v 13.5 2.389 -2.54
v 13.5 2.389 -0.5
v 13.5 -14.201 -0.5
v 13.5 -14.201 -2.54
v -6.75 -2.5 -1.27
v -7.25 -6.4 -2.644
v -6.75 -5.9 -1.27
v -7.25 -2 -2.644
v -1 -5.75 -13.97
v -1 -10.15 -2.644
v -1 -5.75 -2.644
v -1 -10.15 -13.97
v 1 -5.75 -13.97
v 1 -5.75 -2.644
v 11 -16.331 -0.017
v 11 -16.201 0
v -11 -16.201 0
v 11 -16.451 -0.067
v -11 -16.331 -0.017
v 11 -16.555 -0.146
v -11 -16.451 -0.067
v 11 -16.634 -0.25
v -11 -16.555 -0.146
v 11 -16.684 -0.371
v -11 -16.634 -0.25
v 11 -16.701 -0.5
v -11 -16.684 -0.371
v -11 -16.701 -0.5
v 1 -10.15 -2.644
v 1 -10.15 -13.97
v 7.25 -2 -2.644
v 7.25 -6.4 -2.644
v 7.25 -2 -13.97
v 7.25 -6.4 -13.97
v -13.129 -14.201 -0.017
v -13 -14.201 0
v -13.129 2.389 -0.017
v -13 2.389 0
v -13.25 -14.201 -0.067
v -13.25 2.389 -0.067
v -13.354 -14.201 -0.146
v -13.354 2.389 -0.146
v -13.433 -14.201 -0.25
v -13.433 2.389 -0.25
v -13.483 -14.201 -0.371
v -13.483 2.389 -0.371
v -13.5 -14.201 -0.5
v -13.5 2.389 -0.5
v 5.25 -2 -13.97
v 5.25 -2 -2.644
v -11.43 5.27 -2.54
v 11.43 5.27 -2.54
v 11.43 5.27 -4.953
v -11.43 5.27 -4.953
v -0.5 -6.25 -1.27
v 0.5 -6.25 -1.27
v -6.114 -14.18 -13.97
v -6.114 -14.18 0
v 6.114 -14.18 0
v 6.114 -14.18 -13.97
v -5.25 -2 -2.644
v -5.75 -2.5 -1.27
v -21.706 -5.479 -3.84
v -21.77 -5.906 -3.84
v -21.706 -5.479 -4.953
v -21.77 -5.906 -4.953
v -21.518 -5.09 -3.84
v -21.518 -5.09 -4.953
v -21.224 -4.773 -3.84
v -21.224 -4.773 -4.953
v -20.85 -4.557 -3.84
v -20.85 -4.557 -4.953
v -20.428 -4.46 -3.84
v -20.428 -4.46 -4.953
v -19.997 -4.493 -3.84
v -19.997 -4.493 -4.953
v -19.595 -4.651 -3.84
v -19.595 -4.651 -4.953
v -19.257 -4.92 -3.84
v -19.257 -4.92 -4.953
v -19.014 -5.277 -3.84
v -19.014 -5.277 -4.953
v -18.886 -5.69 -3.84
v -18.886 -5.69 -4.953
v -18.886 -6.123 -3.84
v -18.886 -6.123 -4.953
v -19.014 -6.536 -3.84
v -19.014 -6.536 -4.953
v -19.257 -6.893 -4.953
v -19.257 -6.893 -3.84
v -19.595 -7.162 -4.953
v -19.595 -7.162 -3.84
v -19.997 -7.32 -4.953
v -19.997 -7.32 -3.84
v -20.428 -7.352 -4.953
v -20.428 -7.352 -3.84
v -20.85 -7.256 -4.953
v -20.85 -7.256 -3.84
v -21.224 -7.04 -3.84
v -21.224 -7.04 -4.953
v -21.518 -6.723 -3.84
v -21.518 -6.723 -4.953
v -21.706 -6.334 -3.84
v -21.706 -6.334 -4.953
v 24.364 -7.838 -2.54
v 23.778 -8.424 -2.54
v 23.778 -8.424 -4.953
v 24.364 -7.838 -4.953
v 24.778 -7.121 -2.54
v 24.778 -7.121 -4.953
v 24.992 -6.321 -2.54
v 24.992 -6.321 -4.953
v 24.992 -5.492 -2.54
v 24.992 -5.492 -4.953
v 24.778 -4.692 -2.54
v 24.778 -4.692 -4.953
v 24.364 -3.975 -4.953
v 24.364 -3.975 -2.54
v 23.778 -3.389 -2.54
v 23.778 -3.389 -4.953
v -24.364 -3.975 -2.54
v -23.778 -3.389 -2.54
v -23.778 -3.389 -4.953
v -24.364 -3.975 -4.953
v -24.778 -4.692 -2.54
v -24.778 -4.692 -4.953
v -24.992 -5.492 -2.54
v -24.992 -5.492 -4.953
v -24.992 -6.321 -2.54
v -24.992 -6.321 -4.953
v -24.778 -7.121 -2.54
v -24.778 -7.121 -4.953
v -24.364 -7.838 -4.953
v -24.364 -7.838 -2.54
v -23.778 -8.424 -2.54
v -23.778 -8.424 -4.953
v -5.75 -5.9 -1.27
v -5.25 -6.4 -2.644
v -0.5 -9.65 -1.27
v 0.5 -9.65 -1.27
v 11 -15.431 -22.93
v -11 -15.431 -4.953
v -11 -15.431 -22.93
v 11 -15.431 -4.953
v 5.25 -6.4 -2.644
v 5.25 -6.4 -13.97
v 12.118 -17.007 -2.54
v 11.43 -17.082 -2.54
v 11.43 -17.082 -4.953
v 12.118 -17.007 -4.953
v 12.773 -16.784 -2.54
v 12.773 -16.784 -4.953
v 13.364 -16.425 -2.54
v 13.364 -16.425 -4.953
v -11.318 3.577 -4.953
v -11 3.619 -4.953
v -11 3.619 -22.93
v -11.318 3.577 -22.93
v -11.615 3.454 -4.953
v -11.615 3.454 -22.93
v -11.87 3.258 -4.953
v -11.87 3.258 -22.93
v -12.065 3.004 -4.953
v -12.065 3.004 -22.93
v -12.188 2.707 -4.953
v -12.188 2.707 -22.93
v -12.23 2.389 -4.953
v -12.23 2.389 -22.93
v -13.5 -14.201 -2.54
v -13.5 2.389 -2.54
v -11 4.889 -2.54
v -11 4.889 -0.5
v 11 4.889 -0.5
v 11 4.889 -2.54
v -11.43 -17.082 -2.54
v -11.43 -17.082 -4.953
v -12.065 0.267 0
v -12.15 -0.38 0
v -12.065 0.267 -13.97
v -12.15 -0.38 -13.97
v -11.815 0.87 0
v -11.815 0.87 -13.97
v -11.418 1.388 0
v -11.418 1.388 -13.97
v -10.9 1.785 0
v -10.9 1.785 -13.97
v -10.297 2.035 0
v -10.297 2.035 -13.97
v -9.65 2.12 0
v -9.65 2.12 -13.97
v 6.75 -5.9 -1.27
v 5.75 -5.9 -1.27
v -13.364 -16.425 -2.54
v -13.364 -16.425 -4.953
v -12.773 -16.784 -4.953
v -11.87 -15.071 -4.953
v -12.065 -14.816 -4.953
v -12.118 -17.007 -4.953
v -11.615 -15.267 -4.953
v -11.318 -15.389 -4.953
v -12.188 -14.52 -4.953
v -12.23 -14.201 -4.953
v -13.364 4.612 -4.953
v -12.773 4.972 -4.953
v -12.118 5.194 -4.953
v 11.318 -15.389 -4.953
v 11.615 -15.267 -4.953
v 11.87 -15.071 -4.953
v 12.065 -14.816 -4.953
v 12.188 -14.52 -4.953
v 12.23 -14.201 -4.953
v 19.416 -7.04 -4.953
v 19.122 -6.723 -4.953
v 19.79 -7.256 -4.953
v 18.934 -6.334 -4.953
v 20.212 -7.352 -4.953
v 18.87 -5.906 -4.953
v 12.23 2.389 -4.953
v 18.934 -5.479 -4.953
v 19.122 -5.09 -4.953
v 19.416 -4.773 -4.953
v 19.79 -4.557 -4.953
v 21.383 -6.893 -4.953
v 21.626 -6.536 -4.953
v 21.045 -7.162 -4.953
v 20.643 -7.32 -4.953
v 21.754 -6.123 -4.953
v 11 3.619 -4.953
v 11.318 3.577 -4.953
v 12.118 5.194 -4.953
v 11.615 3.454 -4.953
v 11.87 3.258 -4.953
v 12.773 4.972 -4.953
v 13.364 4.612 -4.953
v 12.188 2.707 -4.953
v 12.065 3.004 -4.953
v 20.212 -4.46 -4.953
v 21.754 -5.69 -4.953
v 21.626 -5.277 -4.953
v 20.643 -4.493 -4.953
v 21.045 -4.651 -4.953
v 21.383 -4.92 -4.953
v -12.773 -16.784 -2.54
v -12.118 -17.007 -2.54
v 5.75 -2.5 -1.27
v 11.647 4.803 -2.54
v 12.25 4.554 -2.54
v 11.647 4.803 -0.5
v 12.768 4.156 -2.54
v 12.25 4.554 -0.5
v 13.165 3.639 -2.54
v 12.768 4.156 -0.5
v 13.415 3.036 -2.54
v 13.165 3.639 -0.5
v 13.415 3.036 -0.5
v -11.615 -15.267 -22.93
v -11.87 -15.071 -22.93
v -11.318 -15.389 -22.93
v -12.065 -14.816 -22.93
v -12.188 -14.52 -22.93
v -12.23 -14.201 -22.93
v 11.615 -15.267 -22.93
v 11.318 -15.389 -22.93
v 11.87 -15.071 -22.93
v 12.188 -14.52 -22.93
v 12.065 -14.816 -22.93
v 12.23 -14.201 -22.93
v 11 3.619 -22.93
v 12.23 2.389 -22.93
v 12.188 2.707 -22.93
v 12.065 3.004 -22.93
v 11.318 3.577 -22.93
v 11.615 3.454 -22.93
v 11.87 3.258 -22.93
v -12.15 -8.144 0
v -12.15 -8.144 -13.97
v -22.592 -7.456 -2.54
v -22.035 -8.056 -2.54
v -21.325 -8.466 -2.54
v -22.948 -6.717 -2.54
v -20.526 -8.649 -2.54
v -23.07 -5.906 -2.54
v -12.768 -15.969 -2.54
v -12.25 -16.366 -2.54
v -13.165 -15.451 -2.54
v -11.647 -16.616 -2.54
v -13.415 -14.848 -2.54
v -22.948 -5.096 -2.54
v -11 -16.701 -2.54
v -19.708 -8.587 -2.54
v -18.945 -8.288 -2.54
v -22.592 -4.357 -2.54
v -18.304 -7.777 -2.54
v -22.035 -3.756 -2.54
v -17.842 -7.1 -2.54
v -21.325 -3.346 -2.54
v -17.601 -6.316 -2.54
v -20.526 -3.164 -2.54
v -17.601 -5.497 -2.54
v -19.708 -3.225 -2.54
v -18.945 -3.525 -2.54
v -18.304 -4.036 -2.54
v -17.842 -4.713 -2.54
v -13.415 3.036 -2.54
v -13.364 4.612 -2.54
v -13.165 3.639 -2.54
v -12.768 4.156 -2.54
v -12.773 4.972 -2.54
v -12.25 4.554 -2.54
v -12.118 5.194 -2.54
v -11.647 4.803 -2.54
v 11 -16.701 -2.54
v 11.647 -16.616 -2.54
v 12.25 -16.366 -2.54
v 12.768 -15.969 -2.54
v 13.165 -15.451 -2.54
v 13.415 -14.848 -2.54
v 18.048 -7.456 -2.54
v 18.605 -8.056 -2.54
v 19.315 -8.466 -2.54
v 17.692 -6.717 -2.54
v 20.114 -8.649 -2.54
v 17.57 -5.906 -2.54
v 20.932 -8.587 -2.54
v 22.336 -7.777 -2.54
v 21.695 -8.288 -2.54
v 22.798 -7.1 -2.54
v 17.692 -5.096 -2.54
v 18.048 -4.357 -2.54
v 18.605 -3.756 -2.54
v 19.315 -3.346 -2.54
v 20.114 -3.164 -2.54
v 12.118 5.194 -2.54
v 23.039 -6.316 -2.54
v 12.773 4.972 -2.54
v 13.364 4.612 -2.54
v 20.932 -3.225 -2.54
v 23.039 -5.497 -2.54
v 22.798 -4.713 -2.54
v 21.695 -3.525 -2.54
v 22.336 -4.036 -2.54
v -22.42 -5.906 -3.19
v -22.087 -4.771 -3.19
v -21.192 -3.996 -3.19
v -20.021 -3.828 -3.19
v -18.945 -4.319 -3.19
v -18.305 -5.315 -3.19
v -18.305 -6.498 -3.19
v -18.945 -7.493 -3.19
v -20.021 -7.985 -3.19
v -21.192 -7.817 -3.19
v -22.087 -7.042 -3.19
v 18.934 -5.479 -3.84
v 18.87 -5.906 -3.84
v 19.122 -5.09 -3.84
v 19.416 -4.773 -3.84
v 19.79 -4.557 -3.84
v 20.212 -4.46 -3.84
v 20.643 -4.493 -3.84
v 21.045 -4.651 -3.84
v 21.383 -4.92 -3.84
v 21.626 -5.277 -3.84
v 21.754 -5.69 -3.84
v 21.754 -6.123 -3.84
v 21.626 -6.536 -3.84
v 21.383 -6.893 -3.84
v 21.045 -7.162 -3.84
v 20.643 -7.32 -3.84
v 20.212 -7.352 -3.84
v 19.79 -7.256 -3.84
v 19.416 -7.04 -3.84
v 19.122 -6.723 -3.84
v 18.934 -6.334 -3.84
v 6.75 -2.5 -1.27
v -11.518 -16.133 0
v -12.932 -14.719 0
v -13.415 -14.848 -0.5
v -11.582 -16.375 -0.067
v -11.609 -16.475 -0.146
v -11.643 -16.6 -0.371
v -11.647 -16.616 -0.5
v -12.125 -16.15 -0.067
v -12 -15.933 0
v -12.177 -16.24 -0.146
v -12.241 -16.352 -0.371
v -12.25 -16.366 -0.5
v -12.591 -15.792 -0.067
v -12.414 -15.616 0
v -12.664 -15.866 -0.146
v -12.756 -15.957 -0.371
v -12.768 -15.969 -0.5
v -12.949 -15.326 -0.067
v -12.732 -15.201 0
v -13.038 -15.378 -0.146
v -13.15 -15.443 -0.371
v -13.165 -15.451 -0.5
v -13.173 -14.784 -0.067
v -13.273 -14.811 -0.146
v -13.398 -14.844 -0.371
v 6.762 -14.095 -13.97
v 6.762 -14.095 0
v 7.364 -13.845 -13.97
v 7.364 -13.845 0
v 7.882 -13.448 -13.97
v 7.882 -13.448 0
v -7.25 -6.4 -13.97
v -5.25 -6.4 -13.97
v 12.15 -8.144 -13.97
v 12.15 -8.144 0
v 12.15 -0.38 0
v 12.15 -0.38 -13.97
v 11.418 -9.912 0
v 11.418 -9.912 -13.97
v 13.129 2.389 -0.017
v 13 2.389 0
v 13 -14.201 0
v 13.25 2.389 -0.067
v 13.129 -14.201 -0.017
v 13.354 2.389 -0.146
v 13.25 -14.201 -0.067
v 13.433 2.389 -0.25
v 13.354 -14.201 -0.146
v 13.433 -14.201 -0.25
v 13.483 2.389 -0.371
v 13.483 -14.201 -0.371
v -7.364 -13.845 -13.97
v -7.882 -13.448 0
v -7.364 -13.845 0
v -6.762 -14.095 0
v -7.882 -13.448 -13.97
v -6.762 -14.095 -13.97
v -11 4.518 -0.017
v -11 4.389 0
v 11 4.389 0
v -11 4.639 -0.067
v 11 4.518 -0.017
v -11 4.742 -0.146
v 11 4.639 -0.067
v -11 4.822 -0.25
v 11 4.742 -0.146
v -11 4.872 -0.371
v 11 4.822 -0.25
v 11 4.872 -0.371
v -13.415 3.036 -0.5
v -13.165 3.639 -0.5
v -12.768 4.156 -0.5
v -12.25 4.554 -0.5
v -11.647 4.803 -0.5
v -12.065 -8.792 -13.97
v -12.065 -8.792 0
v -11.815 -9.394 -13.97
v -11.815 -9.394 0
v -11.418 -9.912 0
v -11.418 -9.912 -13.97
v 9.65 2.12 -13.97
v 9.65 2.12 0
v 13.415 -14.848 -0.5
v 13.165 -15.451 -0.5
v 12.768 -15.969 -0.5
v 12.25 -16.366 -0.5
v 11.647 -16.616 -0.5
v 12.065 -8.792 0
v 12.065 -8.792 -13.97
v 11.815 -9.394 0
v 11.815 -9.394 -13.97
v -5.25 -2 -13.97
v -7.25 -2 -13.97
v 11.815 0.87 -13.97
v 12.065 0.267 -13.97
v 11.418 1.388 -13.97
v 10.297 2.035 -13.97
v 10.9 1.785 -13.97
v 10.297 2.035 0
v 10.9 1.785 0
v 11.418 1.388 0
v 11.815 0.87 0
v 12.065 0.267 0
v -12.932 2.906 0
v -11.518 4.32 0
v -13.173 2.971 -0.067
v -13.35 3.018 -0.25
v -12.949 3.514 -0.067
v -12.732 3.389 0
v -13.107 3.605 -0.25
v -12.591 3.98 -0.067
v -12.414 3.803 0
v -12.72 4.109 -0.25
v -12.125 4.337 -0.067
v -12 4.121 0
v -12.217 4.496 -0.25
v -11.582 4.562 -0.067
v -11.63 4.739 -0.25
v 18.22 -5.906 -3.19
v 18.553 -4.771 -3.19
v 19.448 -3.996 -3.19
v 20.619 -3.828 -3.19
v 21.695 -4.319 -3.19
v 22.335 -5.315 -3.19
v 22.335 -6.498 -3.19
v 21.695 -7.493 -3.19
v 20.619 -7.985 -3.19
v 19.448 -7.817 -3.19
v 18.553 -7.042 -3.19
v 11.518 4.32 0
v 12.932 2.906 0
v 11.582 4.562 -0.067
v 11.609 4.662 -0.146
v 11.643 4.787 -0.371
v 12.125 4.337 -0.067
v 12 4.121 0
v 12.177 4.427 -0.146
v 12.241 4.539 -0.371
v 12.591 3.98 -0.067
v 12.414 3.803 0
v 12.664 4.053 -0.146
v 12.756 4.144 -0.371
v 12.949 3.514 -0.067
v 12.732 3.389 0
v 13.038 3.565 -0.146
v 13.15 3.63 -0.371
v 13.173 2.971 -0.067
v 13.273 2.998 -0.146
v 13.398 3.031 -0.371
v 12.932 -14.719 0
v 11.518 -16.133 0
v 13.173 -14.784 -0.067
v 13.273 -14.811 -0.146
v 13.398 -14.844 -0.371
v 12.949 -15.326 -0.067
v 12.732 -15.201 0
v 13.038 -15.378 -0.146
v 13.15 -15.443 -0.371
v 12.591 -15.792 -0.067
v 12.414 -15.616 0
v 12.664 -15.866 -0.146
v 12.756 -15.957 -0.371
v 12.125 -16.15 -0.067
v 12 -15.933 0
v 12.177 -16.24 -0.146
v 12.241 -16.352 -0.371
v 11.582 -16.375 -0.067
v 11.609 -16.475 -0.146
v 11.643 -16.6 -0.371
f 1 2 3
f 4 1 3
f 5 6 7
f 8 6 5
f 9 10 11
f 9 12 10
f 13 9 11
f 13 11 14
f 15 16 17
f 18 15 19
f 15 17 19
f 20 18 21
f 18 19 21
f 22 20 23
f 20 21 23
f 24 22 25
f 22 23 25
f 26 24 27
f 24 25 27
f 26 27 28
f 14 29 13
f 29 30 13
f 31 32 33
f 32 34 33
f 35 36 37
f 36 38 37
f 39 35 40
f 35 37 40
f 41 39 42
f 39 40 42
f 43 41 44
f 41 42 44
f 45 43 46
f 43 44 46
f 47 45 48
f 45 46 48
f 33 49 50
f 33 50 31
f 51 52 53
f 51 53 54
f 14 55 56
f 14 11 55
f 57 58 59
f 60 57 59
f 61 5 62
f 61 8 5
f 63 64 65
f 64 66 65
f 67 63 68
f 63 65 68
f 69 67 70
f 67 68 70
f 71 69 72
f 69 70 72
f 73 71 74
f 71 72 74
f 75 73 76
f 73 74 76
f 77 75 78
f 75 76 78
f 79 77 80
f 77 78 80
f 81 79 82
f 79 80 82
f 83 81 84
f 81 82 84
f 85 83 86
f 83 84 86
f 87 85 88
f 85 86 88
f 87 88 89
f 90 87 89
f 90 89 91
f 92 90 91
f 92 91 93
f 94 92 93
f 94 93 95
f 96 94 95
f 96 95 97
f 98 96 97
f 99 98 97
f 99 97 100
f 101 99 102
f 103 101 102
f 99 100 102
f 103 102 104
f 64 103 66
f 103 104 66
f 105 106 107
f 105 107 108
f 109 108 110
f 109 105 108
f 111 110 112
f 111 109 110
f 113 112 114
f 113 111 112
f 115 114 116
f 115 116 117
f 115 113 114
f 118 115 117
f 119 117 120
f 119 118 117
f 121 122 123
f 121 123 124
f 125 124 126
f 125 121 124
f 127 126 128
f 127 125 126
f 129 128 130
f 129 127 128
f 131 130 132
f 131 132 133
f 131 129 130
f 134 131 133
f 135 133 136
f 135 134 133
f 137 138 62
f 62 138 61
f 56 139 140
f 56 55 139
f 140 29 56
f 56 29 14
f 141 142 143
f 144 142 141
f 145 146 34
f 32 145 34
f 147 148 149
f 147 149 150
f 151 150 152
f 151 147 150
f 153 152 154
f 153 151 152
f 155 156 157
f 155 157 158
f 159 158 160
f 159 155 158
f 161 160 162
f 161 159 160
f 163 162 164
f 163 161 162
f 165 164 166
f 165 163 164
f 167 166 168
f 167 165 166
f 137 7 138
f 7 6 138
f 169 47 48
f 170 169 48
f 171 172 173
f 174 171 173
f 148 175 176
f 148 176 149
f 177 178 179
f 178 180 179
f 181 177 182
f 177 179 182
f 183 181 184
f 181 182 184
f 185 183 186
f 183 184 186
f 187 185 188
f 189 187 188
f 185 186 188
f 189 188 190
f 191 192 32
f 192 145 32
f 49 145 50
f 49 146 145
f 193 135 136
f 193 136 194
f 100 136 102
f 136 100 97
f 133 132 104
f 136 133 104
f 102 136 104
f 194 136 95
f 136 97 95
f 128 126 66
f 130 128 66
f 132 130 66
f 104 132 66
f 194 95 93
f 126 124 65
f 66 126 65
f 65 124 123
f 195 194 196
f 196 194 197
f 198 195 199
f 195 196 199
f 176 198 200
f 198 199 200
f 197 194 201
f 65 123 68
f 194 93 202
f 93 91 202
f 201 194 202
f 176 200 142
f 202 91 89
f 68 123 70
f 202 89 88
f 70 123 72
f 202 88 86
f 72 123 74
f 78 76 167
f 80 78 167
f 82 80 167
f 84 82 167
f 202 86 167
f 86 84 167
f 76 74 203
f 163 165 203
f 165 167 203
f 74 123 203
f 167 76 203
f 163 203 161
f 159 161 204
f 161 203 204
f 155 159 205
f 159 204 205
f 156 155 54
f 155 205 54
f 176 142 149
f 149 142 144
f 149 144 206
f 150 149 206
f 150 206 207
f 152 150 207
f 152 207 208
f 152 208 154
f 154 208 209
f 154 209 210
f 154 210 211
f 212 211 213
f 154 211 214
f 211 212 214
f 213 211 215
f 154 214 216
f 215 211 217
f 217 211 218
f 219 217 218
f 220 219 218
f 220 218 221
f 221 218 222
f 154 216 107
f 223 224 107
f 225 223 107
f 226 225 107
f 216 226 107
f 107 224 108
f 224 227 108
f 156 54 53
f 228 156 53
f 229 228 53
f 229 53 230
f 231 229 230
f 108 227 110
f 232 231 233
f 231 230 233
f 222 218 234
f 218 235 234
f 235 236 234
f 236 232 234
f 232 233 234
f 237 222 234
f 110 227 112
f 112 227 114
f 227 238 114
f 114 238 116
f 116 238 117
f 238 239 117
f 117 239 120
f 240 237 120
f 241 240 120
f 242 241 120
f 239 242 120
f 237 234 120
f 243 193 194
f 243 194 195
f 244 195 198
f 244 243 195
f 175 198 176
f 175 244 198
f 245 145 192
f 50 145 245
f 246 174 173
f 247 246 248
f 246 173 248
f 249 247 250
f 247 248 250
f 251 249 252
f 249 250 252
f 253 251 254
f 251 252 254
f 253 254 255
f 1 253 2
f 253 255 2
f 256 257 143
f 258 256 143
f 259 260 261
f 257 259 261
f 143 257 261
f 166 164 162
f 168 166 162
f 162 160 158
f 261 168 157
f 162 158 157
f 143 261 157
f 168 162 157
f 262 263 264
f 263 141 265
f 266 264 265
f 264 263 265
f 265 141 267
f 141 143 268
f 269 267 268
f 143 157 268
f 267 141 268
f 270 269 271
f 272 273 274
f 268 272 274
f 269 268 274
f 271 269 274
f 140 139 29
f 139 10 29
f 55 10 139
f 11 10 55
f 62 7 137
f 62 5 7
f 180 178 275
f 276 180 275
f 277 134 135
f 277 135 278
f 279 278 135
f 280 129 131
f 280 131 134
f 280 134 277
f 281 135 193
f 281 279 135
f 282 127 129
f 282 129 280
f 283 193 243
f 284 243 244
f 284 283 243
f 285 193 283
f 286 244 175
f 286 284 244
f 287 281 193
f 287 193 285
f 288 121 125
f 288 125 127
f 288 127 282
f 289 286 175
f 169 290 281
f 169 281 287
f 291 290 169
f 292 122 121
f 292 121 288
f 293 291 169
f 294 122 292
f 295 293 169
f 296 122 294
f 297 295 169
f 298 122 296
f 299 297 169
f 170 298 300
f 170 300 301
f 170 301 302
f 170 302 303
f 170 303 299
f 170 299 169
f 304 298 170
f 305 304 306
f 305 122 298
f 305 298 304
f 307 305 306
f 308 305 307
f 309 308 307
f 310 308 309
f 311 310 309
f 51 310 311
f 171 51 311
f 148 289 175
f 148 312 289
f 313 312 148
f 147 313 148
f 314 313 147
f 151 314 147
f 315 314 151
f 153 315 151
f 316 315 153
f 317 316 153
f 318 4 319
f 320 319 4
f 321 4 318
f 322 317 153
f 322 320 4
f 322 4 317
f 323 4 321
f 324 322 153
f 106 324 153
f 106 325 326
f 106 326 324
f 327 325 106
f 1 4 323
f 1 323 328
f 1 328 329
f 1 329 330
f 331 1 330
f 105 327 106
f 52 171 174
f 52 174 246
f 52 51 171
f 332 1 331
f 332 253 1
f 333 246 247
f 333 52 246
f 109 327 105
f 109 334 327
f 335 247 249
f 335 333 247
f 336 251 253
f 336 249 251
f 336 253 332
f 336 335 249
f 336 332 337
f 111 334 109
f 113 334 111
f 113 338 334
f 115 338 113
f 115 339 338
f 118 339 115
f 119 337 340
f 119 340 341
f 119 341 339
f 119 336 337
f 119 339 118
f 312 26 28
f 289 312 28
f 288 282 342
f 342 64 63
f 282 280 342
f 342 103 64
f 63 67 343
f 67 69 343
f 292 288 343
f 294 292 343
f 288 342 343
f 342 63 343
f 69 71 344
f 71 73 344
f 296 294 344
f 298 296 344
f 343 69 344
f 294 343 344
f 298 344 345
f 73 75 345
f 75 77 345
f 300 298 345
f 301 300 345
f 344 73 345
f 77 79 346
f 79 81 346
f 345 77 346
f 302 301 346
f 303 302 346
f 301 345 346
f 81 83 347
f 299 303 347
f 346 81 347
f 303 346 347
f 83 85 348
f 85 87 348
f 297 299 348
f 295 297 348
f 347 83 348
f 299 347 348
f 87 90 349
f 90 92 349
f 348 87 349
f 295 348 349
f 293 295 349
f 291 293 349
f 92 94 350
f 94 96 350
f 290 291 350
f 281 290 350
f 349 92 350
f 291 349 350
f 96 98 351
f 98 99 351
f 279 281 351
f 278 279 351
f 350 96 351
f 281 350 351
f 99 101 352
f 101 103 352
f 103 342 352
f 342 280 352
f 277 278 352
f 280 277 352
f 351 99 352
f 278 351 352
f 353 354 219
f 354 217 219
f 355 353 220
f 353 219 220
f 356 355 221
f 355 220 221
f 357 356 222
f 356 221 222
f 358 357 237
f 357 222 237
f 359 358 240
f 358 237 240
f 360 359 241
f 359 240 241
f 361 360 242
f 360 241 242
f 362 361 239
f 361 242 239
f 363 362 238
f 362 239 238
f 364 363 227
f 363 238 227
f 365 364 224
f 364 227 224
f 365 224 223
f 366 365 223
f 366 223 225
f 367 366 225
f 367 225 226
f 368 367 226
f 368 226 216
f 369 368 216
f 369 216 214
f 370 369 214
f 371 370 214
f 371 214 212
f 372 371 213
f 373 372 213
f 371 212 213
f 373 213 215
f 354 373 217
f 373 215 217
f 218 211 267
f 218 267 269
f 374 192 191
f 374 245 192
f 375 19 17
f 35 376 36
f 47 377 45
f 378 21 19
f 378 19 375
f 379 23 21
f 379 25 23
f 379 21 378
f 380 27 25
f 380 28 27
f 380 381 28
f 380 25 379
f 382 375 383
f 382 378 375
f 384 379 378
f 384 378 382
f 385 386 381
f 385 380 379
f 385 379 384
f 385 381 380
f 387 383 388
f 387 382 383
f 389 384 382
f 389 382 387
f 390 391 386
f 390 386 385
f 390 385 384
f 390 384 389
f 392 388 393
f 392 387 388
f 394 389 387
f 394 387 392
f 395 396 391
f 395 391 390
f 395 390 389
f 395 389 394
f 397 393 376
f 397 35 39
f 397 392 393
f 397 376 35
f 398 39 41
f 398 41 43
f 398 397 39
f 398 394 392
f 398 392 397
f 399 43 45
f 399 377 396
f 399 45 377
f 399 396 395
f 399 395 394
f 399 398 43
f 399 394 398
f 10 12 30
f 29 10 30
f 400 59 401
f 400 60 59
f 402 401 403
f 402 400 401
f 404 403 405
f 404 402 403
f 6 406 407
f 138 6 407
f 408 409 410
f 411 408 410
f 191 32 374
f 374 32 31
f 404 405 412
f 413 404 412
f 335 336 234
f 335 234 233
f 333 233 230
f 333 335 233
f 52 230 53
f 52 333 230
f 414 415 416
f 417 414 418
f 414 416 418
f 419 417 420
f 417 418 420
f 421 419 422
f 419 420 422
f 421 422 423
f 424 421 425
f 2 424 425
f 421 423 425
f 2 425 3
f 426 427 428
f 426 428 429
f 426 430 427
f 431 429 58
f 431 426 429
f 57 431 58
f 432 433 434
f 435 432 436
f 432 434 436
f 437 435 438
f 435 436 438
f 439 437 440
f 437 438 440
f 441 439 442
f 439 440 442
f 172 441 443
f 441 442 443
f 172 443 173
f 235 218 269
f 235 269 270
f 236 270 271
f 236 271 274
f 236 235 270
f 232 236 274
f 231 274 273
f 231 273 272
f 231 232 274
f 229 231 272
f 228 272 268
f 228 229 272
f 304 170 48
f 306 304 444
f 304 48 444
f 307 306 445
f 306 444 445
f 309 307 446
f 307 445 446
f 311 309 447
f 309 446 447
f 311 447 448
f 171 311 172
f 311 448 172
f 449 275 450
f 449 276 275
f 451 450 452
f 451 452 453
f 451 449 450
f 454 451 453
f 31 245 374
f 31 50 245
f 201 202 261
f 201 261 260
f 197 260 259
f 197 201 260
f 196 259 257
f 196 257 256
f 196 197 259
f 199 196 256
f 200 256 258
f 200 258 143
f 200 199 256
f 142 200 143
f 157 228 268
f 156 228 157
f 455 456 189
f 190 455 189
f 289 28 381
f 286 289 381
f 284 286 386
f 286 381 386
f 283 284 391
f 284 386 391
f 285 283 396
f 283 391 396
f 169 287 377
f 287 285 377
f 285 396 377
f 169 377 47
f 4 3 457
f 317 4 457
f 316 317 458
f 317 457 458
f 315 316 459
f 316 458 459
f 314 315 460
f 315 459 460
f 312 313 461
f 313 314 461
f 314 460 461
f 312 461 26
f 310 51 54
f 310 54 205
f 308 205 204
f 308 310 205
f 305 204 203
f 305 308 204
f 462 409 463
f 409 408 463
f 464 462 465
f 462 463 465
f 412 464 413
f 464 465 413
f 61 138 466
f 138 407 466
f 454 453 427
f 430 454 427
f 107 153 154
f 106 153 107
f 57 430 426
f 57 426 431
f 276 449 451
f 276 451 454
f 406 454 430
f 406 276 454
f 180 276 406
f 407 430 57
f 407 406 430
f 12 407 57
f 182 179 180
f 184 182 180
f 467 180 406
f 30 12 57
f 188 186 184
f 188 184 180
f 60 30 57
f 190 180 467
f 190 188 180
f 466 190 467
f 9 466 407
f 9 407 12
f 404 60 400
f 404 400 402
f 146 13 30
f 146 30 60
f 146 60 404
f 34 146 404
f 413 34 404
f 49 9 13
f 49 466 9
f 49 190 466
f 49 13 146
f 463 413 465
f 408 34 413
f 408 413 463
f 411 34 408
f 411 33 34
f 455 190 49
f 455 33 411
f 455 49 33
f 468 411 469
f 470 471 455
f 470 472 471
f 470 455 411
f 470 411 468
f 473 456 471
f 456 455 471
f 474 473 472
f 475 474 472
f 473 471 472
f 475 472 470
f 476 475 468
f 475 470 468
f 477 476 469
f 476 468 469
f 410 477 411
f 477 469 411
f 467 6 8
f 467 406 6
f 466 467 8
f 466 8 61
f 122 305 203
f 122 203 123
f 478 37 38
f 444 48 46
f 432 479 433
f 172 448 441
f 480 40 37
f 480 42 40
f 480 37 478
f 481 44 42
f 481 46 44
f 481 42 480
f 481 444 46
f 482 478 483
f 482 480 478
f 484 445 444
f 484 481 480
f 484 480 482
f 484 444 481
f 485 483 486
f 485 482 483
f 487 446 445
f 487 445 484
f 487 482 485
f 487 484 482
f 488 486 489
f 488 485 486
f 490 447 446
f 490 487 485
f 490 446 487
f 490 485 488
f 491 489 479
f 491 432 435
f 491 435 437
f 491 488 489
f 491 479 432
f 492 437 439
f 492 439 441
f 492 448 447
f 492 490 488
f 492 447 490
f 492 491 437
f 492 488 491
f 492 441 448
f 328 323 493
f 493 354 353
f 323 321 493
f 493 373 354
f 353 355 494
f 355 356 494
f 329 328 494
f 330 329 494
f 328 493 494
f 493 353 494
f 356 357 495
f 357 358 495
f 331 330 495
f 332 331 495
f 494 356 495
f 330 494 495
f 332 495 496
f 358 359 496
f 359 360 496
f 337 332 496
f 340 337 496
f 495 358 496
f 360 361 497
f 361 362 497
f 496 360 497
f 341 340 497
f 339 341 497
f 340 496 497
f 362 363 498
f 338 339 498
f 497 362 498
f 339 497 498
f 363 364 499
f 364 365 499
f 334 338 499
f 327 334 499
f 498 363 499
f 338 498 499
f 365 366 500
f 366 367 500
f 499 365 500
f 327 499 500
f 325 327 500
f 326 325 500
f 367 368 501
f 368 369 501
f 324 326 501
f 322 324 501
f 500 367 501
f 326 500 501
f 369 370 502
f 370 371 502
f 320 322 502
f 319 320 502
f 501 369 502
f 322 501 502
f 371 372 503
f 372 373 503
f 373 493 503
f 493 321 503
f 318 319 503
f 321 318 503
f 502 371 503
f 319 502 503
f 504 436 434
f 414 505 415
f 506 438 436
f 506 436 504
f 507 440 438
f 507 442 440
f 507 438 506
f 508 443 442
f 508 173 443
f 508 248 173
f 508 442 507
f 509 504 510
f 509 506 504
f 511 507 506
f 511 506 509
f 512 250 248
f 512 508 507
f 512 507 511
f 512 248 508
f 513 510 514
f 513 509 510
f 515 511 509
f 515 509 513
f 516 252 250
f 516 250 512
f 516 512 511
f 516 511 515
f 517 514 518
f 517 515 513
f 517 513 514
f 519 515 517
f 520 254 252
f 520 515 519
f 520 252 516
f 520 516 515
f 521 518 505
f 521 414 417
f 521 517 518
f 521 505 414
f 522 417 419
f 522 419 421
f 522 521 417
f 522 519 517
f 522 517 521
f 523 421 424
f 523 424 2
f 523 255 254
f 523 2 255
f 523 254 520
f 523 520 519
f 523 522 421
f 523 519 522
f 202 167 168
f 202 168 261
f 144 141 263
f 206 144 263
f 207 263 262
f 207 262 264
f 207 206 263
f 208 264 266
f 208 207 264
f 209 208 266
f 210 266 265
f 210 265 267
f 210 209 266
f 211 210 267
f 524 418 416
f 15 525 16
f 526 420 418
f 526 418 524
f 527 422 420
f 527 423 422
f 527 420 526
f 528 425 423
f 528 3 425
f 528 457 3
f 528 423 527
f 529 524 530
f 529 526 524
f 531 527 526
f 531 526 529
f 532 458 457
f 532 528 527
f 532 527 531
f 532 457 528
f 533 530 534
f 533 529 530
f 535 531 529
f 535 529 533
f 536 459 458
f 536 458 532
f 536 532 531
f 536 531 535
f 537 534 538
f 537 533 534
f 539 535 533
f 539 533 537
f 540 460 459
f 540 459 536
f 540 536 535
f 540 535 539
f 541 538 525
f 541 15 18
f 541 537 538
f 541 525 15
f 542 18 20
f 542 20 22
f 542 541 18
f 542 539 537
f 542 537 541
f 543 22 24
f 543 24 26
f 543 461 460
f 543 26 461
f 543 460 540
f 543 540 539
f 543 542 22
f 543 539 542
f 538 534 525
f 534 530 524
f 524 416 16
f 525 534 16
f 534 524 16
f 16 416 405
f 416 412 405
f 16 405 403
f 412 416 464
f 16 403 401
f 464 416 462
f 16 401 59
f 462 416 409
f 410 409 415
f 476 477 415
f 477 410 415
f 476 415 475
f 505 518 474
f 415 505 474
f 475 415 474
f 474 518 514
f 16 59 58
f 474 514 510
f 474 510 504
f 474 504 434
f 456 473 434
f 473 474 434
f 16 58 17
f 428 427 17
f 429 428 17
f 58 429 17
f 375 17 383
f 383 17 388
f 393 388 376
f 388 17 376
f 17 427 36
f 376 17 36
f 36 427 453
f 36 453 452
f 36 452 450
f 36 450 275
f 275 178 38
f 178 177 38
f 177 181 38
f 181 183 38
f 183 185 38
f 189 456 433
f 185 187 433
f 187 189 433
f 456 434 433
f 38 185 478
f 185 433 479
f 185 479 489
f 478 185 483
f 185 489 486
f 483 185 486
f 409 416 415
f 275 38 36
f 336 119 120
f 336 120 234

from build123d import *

# Parameters (mm, degrees)
EXTRUDE1_DEPTH                                    = 5.15
FILLET1_R                                         = 1
EXTRUDE2_DEPTH                                    = 17.78
EXTRUDE3_DEPTH                                    = 13.97
EXTRUDE4_DEPTH                                    = 3.81
FILLET2_R                                         = 2.5
SKETCH5_W                                         = 2
SKETCH5_H                                         = 4.4
EXTRUDE5_DEPTH                                    = 12.7
CHAMFER1_SIZE                                     = 0.5
CHAMFER1_SIZE2                                    = 1.37373871
CHAMFER1_PART_2_SIZE                              = 0.5
CHAMFER1_PART_2_SIZE2                             = 1.37373871
CHAMFER1_PART_3_SIZE                              = 0.5
CHAMFER1_PART_3_SIZE2                             = 1.37373871
CHAMFER2_SIZE                                     = 0.5
CHAMFER2_SIZE2                                    = 1.37373871
CHAMFER2_PART_2_SIZE                              = 0.5
CHAMFER2_PART_2_SIZE2                             = 1.37373871
CHAMFER2_PART_3_SIZE                              = 0.5
CHAMFER2_PART_3_SIZE2                             = 1.37373871
FILLET3_R                                         = 0.5
SKETCH10_OUTSIDE_W                                = 57.448
SKETCH10_OUTSIDE_H                                = 47.956
EXTRUDE10_DEPTH                                   = 20.12
SKETCH11_OUTSIDE_W                                = 37.296
SKETCH11_OUTSIDE_H                                = 31.886
EXTRUDE11_DEPTH                                   = 21.39
EXTRUDE12_DEPTH                                   = 2.413
CSK_FOR_M2_5_FLAT_HEAD_MACHINE_SCREW1_D           = 2.9
CSK_FOR_M2_5_FLAT_HEAD_MACHINE_SCREW1_CSINK_D     = 5.5
CSK_FOR_M2_5_FLAT_HEAD_MACHINE_SCREW1_CSINK_ANGLE = 90


with BuildPart() as part:
    # Sketch1 → Extrude1 (new body)
    with BuildSketch(Plane.XY):
        with BuildLine():
            Line((-13.6, 17), (13.6, 17))
            Line((13.6, 17), (21.429179607, 1.341640786))
            ThreePointArc((21.429179607, 1.341640786), (21.745898034, 0), (21.429179607, -1.341640786))
            Line((21.429179607, -1.341640786), (13.6, -17))
            Line((13.6, -17), (-13.6, -17))
            Line((-13.6, -17), (-21.429179607, -1.341640786))
            ThreePointArc((-21.429179607, -1.341640786), (-21.745898034, 0), (-21.429179607, 1.341640786))
            Line((-21.429179607, 1.341640786), (-13.6, 17))
        make_face()
    extrude(amount=-EXTRUDE1_DEPTH)

    # Fillet1
    fillet1_edges = [part.edges().sort_by_distance(p)[0] for p in [
        (-13.6, 17, -2.575),
        (13.6, 17, -2.575),
        (13.6, -17, -2.575),
        (-13.6, -17, -2.575),
    ]]
    fillet(fillet1_edges, radius=FILLET1_R)

    # Sketch2 → Extrude2 (add)
    with BuildSketch(Plane(origin=(0, 0, -5.15), x_dir=(-1, 0, 0), z_dir=(0, 0, -1))):
        with BuildLine():
            Line((-12.9, 15.65), (12.9, 15.65))
            ThreePointArc((12.9, 15.65), (13.607106781, 15.357106781), (13.9, 14.65))
            Line((13.9, 14.65), (13.9, -14.65))
            ThreePointArc((13.9, -14.65), (13.607106781, -15.357106781), (12.9, -15.65))
            Line((12.9, -15.65), (-12.9, -15.65))
            ThreePointArc((-12.9, -15.65), (-13.607106781, -15.357106781), (-13.9, -14.65))
            Line((-13.9, -14.65), (-13.9, 14.65))
            ThreePointArc((-13.9, 14.65), (-13.607106781, 15.357106781), (-12.9, 15.65))
        make_face()
    extrude(amount=EXTRUDE2_DEPTH)

    # Sketch3 → Extrude3 (cut)
    with BuildSketch(Plane.XY):
        Polygon((-12.15, -9.18), (-7.15, -14.18), (7.15, -14.18), (12.15, -9.18), (12.15, 2.12), (-12.15, 2.12), align=None)
    extrude(amount=-EXTRUDE3_DEPTH, mode=Mode.SUBTRACT)

    # Sketch4 → Extrude4 (cut)
    with BuildSketch(Plane.XY):
        with BuildLine():
            Line((-21.429179607, -1.341640786), (-13.876393202, -16.447213595))
            ThreePointArc((-13.876393202, -16.447213595), (-13.507697123, -16.850650808), (-12.981966011, -17))
            Line((-12.981966011, -17), (12.981966011, -17))
            ThreePointArc((12.981966011, -17), (13.507697123, -16.850650808), (13.876393202, -16.447213595))
            Line((13.876393202, -16.447213595), (21.429179607, -1.341640786))
            ThreePointArc((21.429179607, -1.341640786), (21.745898034, 0), (21.429179607, 1.341640786))
            Line((21.429179607, 1.341640786), (13.876393202, 16.447213595))
            ThreePointArc((13.876393202, 16.447213595), (13.507697123, 16.850650808), (12.981966011, 17))
            Line((12.981966011, 17), (-12.981966011, 17))
            ThreePointArc((-12.981966011, 17), (-13.507697123, 16.850650808), (-13.876393202, 16.447213595))
            Line((-13.876393202, 16.447213595), (-21.429179607, 1.341640786))
            ThreePointArc((-21.429179607, 1.341640786), (-21.745898034, 0), (-21.429179607, -1.341640786))
        make_face()
        with BuildLine():
            Line((-11, 4.8886), (11, 4.8886))
            ThreePointArc((11, 4.8886), (12.767766953, 4.156366953), (13.5, 2.3886))
            Line((13.5, 2.3886), (13.5, -14.2014))
            ThreePointArc((13.5, -14.2014), (12.767766953, -15.969166953), (11, -16.7014))
            Line((11, -16.7014), (-11, -16.7014))
            ThreePointArc((-11, -16.7014), (-12.767766953, -15.969166953), (-13.5, -14.2014))
            Line((-13.5, -14.2014), (-13.5, 2.3886))
            ThreePointArc((-13.5, 2.3886), (-12.767766953, 4.156366953), (-11, 4.8886))
        make_face(mode=Mode.SUBTRACT)
    extrude(amount=-EXTRUDE4_DEPTH, mode=Mode.SUBTRACT)

    # Fillet2
    fillet2_edges = [part.edges().sort_by_distance(p)[0] for p in [
        (-12.15, -9.18, -6.985),
        (-12.15, 2.12, -6.985),
        (12.15, 2.12, -6.985),
        (12.15, -9.18, -6.985),
        (7.15, -14.18, -6.985),
        (-7.15, -14.18, -6.985),
    ]]
    fillet(fillet2_edges, radius=FILLET2_R)

    # Sketch5 → Extrude5 (add)
    with BuildSketch(Plane.XY.offset(-13.97)):
        with Locations((-6.25, -4.2)):
            Rectangle(SKETCH5_W, SKETCH5_H)
        with Locations((0, -7.95)):
            Rectangle(SKETCH5_W, SKETCH5_H)
        with Locations((6.25, -4.2)):
            Rectangle(SKETCH5_W, SKETCH5_H)
    extrude(amount=EXTRUDE5_DEPTH)

    # Chamfer1
    chamfer1_edges = [part.edges().sort_by_distance(p)[0] for p in [
        (-6.25, -6.4, -1.27),
        (-6.25, -2, -1.27),
    ]]
    chamfer1_side = [part.faces().sort_by_distance(p)[0] for p in [
        (-6.25, -4.2, -1.27),
    ]]
    chamfer(chamfer1_edges, length=CHAMFER1_SIZE, length2=CHAMFER1_SIZE2, reference=chamfer1_side[0])

    # Chamfer1 part 2
    chamfer1_part_2_edges = [part.edges().sort_by_distance(p)[0] for p in [
        (0, -10.15, -1.27),
        (0, -5.75, -1.27),
    ]]
    chamfer1_part_2_side = [part.faces().sort_by_distance(p)[0] for p in [
        (0, -7.95, -1.27),
    ]]
    chamfer(chamfer1_part_2_edges, length=CHAMFER1_PART_2_SIZE, length2=CHAMFER1_PART_2_SIZE2, reference=chamfer1_part_2_side[0])

    # Chamfer1 part 3
    chamfer1_part_3_edges = [part.edges().sort_by_distance(p)[0] for p in [
        (6.25, -2, -1.27),
        (6.25, -6.4, -1.27),
    ]]
    chamfer1_part_3_side = [part.faces().sort_by_distance(p)[0] for p in [
        (6.25, -4.2, -1.27),
    ]]
    chamfer(chamfer1_part_3_edges, length=CHAMFER1_PART_3_SIZE, length2=CHAMFER1_PART_3_SIZE2, reference=chamfer1_part_3_side[0])

    # Chamfer2
    chamfer2_edges = [part.edges().sort_by_distance(p)[0] for p in [
        (7.25, -4.2, -1.27),
        (5.25, -4.2, -1.27),
    ]]
    chamfer2_side = [part.faces().sort_by_distance(p)[0] for p in [
        (6.25, -4.2, -1.27),
    ]]
    chamfer(chamfer2_edges, length=CHAMFER2_SIZE, length2=CHAMFER2_SIZE2, reference=chamfer2_side[0])

    # Chamfer2 part 2
    chamfer2_part_2_edges = [part.edges().sort_by_distance(p)[0] for p in [
        (1, -7.95, -1.27),
        (-1, -7.95, -1.27),
    ]]
    chamfer2_part_2_side = [part.faces().sort_by_distance(p)[0] for p in [
        (0, -7.95, -1.27),
    ]]
    chamfer(chamfer2_part_2_edges, length=CHAMFER2_PART_2_SIZE, length2=CHAMFER2_PART_2_SIZE2, reference=chamfer2_part_2_side[0])

    # Chamfer2 part 3
    chamfer2_part_3_edges = [part.edges().sort_by_distance(p)[0] for p in [
        (-7.25, -4.2, -1.27),
        (-5.25, -4.2, -1.27),
    ]]
    chamfer2_part_3_side = [part.faces().sort_by_distance(p)[0] for p in [
        (-6.25, -4.2, -1.27),
    ]]
    chamfer(chamfer2_part_3_edges, length=CHAMFER2_PART_3_SIZE, length2=CHAMFER2_PART_3_SIZE2, reference=chamfer2_part_3_side[0])

    # Fillet3
    fillet3_edges = [part.edges().sort_by_distance(p)[0] for p in [
        (-12.767766953, 4.156366953, 0),
        (0, 4.8886, 0),
        (12.767766953, 4.156366953, 0),
        (13.5, -5.9064, 0),
        (12.767766953, -15.969166953, 0),
        (0, -16.7014, 0),
        (-12.767766953, -15.969166953, 0),
        (-13.5, -5.9064, 0),
    ]]
    fillet(fillet3_edges, radius=FILLET3_R)

    # Sketch10 outside → Extrude10 (cut, through all)
    with BuildSketch(Plane.XY.offset(-3.81)):
        Rectangle(SKETCH10_OUTSIDE_W, SKETCH10_OUTSIDE_H)
        with BuildLine():
            Line((-13.5, 2.3886), (-13.5, -14.2014))
            ThreePointArc((-13.5, -14.2014), (-12.767766953, -15.969166953), (-11, -16.7014))
            Line((-11, -16.7014), (11, -16.7014))
            ThreePointArc((11, -16.7014), (12.767766953, -15.969166953), (13.5, -14.2014))
            Line((13.5, -14.2014), (13.5, 2.3886))
            ThreePointArc((13.5, 2.3886), (12.767766953, 4.156366953), (11, 4.8886))
            Line((11, 4.8886), (-11, 4.8886))
            ThreePointArc((-11, 4.8886), (-12.767766953, 4.156366953), (-13.5, 2.3886))
        make_face(mode=Mode.SUBTRACT)
    extrude(amount=-EXTRUDE10_DEPTH, mode=Mode.SUBTRACT)

    # Sketch11 outside → Extrude11 (cut, through all)
    with BuildSketch(Plane.XY.offset(-2.54)):
        with Locations((0, -5.906)):
            Rectangle(SKETCH11_OUTSIDE_W, SKETCH11_OUTSIDE_H)
        with BuildLine():
            Line((-11, -15.4314), (11, -15.4314))
            ThreePointArc((11, -15.4314), (11.869741341, -15.071141341), (12.23, -14.2014))
            Line((12.23, -14.2014), (12.23, 2.3886))
            ThreePointArc((12.23, 2.3886), (11.869741341, 3.258341341), (11, 3.6186))
            Line((11, 3.6186), (-11, 3.6186))
            ThreePointArc((-11, 3.6186), (-11.869741341, 3.258341341), (-12.23, 2.3886))
            Line((-12.23, 2.3886), (-12.23, -14.2014))
            ThreePointArc((-12.23, -14.2014), (-11.869741341, -15.071141341), (-11, -15.4314))
        make_face(mode=Mode.SUBTRACT)
    extrude(amount=-EXTRUDE11_DEPTH, mode=Mode.SUBTRACT)

    # Sketch12 → Extrude12 (add)
    with BuildSketch(Plane(origin=(0, 0, -2.54), x_dir=(-1, 0, 0), z_dir=(0, 0, -1))):
        with BuildLine():
            Line((-11.43, 5.2696), (11.43, 5.2696))
            ThreePointArc((11.43, 5.2696), (12.451483532, 5.100793007), (13.364347496, 4.612322138))
            Line((13.364347496, 4.612322138), (23.778347496, -3.388677862))
            ThreePointArc((23.778347496, -3.388677862), (25.019, -5.9064), (23.778347496, -8.424122138))
            Line((23.778347496, -8.424122138), (13.364347496, -16.425122138))
            ThreePointArc((13.364347496, -16.425122138), (12.451483532, -16.913593007), (11.43, -17.0824))
            Line((11.43, -17.0824), (-11.43, -17.0824))
            ThreePointArc((-11.43, -17.0824), (-12.451483532, -16.913593007), (-13.364347496, -16.425122138))
            Line((-13.364347496, -16.425122138), (-23.778347496, -8.424122138))
            ThreePointArc((-23.778347496, -8.424122138), (-25.019, -5.9064), (-23.778347496, -3.388677862))
            Line((-23.778347496, -3.388677862), (-13.364347496, 4.612322138))
            ThreePointArc((-13.364347496, 4.612322138), (-12.451483532, 5.100793007), (-11.43, 5.2696))
        make_face()
        with BuildLine():
            Line((12.23, 2.3886), (12.23, -14.2014))
            ThreePointArc((12.23, -14.2014), (11.869741341, -15.071141341), (11, -15.4314))
            Line((11, -15.4314), (-11, -15.4314))
            ThreePointArc((-11, -15.4314), (-11.869741341, -15.071141341), (-12.23, -14.2014))
            Line((-12.23, -14.2014), (-12.23, 2.3886))
            ThreePointArc((-12.23, 2.3886), (-11.869741341, 3.258341341), (-11, 3.6186))
            Line((-11, 3.6186), (11, 3.6186))
            ThreePointArc((11, 3.6186), (11.869741341, 3.258341341), (12.23, 2.3886))
        make_face(mode=Mode.SUBTRACT)
    extrude(amount=EXTRUDE12_DEPTH)

    # CSK for M2.5 Flat Head Machine Screw1 (through all)
    with Locations(Plane.XY.offset(-2.54)):
        with Locations((-20.32, -5.9064), (20.32, -5.9064)):
            CounterSinkHole(CSK_FOR_M2_5_FLAT_HEAD_MACHINE_SCREW1_D / 2, CSK_FOR_M2_5_FLAT_HEAD_MACHINE_SCREW1_CSINK_D / 2, counter_sink_angle=CSK_FOR_M2_5_FLAT_HEAD_MACHINE_SCREW1_CSINK_ANGLE)


solid = part.part
